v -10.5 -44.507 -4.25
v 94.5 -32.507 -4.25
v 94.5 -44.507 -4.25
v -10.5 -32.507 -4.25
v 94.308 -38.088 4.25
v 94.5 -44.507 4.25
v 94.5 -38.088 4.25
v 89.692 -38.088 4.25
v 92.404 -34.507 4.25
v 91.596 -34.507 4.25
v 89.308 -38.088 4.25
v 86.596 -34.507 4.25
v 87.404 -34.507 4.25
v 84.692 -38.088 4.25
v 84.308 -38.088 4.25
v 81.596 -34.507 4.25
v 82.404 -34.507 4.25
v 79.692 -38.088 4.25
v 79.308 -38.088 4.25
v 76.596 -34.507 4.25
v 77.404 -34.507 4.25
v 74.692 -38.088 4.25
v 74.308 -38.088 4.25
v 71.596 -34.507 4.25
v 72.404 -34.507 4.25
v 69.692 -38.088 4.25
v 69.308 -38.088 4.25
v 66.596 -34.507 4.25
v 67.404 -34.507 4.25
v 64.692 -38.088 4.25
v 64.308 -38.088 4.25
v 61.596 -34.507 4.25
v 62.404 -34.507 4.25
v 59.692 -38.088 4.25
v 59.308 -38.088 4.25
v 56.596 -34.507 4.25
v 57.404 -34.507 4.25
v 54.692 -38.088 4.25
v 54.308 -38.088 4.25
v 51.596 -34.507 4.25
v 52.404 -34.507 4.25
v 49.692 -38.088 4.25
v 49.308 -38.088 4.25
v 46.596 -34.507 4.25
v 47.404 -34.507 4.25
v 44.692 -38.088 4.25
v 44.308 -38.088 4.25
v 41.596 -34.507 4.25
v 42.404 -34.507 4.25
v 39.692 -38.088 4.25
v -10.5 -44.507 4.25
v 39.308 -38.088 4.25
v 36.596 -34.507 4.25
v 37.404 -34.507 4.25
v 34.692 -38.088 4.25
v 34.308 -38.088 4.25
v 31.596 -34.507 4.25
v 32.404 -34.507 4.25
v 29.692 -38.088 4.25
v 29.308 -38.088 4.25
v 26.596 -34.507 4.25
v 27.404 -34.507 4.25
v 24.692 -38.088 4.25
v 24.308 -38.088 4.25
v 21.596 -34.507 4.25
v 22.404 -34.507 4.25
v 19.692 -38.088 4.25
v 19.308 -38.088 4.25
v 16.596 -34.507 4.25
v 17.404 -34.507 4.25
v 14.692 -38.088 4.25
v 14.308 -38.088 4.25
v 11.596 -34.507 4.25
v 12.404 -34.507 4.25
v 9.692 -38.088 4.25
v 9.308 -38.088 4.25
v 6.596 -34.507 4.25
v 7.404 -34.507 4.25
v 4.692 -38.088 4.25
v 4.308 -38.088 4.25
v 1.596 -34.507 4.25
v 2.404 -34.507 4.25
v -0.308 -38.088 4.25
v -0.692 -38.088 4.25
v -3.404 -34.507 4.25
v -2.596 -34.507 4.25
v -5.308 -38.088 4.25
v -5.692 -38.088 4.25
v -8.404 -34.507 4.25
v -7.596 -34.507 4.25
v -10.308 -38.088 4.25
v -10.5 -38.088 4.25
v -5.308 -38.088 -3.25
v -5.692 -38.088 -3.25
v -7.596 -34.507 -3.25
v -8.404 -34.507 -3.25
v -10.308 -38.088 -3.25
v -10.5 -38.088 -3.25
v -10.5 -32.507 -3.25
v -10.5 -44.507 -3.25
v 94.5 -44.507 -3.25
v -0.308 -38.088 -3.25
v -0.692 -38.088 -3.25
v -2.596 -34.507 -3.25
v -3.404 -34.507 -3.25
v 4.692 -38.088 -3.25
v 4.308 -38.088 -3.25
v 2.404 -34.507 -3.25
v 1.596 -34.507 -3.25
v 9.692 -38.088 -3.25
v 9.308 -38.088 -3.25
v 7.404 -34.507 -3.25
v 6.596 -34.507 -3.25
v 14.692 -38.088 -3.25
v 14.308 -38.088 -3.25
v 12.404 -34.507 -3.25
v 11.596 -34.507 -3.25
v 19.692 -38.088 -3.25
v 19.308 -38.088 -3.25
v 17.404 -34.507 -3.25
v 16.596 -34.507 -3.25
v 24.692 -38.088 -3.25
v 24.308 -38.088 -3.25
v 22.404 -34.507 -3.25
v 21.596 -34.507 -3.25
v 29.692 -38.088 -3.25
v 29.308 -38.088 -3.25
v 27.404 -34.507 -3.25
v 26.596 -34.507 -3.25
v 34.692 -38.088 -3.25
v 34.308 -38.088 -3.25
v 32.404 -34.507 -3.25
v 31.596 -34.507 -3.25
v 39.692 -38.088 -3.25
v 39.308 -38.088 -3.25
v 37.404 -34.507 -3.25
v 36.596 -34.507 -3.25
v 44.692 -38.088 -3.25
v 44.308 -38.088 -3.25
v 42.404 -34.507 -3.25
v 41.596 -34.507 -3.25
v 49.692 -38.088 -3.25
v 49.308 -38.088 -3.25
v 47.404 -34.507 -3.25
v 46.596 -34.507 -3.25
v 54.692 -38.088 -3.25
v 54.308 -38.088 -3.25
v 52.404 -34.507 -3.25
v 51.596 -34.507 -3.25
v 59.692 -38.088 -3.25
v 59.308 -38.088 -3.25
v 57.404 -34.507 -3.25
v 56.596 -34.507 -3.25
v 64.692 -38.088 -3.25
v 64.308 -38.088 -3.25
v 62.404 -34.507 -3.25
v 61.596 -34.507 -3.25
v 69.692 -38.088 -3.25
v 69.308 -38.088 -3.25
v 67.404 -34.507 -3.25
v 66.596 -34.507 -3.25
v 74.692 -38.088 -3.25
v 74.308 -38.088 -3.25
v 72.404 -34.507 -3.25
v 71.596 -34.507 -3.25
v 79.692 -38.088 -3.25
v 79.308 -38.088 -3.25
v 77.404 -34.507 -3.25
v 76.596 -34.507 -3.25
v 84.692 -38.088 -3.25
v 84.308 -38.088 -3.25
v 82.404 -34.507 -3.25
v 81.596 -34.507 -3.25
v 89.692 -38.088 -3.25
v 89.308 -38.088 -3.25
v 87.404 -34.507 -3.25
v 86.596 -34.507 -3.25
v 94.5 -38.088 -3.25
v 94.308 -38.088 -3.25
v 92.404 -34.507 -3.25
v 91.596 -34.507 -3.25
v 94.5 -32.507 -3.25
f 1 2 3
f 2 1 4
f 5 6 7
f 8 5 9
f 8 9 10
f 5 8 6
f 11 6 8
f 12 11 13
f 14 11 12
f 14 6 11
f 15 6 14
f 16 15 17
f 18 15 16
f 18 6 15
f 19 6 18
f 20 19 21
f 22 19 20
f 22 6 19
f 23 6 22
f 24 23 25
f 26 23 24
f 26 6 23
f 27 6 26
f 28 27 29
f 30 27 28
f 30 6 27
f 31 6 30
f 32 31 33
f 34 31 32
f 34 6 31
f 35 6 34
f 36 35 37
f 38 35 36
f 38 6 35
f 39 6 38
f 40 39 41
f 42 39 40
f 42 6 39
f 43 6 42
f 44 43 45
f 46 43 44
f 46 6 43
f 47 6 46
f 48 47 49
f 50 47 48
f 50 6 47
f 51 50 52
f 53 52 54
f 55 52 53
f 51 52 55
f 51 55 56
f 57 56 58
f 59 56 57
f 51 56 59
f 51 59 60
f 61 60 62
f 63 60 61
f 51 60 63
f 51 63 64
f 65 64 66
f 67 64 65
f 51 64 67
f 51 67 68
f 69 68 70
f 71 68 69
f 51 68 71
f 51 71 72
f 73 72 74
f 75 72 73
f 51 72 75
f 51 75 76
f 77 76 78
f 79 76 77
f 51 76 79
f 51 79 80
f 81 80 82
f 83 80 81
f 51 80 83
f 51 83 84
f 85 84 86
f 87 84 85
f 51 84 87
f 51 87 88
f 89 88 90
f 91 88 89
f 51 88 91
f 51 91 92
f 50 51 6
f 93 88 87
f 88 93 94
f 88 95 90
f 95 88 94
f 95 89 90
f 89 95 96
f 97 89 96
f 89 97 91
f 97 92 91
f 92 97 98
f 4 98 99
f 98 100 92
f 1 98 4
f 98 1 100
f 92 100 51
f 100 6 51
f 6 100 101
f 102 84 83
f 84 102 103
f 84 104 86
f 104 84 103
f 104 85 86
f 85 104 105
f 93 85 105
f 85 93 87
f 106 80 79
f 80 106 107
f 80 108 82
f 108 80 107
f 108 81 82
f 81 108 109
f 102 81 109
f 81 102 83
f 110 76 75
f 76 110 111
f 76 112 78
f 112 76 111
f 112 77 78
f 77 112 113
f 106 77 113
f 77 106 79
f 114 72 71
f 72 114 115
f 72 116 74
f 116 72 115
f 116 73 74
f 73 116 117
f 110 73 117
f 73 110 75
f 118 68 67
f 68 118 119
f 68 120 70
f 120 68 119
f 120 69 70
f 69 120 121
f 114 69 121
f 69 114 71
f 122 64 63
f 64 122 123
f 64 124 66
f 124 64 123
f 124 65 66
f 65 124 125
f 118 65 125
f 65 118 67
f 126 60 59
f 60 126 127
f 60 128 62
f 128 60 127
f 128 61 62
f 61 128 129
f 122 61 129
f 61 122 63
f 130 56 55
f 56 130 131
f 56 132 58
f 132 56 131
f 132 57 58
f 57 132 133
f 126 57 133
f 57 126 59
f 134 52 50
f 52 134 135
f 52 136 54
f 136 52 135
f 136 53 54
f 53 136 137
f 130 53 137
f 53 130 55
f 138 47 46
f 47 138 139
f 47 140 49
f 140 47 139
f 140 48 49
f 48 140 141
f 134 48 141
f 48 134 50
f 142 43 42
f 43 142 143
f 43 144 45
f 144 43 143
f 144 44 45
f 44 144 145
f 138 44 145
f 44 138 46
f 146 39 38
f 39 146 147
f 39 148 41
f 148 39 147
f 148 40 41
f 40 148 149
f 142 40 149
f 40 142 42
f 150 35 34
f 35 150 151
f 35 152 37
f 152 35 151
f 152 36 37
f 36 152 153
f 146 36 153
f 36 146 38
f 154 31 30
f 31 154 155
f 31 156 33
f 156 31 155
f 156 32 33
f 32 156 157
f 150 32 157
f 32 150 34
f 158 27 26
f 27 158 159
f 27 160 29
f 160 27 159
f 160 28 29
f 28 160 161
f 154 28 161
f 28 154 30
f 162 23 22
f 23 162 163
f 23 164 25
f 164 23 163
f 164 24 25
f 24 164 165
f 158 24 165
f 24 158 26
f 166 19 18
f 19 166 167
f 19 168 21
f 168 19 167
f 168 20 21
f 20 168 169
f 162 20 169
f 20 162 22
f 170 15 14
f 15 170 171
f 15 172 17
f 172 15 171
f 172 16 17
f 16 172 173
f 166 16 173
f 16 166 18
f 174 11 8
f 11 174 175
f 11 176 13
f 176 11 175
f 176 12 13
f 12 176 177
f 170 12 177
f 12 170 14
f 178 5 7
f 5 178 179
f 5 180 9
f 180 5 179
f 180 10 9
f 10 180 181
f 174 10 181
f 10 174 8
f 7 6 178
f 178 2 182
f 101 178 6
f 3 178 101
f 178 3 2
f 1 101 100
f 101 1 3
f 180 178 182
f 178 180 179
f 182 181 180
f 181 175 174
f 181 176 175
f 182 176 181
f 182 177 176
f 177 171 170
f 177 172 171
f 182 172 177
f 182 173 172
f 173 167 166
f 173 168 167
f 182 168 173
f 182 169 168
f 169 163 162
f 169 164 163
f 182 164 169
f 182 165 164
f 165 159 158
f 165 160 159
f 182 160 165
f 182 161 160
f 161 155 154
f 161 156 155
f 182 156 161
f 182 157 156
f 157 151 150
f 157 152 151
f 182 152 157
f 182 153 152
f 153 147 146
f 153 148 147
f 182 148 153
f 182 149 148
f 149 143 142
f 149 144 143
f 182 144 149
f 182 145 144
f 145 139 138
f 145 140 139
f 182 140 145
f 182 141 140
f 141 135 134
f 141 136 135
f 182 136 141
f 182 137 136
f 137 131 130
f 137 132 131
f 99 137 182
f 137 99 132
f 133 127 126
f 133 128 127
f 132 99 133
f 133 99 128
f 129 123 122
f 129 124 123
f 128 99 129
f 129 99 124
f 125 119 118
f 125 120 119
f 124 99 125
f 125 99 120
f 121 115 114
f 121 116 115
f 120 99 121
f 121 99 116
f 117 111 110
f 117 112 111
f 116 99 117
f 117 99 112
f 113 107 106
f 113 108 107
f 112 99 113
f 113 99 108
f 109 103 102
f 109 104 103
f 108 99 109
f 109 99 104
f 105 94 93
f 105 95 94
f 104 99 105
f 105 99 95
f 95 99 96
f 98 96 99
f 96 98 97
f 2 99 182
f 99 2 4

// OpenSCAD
//This is a modification of " Public Domain Parametric Involute Spur Gear (and involute helical gear and involute rack)
// by Leemon Baird, 2011, Leemon@Leemon.com
//http://www.thingiverse.com/thing:5505  "

//Modifications by racatack June 2016:
//  -Incorporated 'module InvoluteGear_rack()' from the 11/11/15 comment by quisam2342 in thing:5505 to fix noted problems in rack generation at various tooth sizes
//  -Added a section for an optional 'backboard' that can be used to stiffen an otherwise skinny rack
//  -Added sections for optional Stop Blocks at either or both ends of a rack
//  -Removed extra gears from the example since I only need one pinion. See thing:5505 example section to gain more insight into gear generation.





//////////////////////////////////////////////////////////////////////////////////////////////
// Public Domain Parametric Involute Spur Gear (and involute helical gear and involute rack)
// version 1.1
// by Leemon Baird, 2011, Leemon@Leemon.com
//http://www.thingiverse.com/thing:5505
//
// This file is public domain.  Use it for any purpose, including commercial
// applications.  Attribution would be nice, but is not required.  There is
// no warranty of any kind, including its correctness, usefulness, or safety.
// 
// This is parameterized involute spur (or helical) gear.  It is much simpler and less powerful than
// others on Thingiverse.  But it is public domain.  I implemented it from scratch from the 
// descriptions and equations on Wikipedia and the web, using Mathematica for calculations and testing,
// and I now release it into the public domain.
//
//		http://en.wikipedia.org/wiki/Involute_gear
//		http://en.wikipedia.org/wiki/Gear
//		http://en.wikipedia.org/wiki/List_of_gear_nomenclature
//		http://gtrebaol.free.fr/doc/catia/spur_gear.html
//		http://www.cs.cmu.edu/~rapidproto/mechanisms/chpt7.html
//
// The module gear() gives an involute spur gear, with reasonable defaults for all the parameters.
// Normally, you should just choose the first 4 parameters, and let the rest be default values.
// The module gear() gives a gear in the XY plane, centered on the origin, with one tooth centered on
// the positive Y axis.  The various functions below it take the same parameters, and return various
// measurements for the gear.  The most important is pitch_radius, which tells how far apart to space
// gears that are meshing, and adendum_radius, which gives the size of the region filled by the gear.
// A gear has a "pitch circle", which is an invisible circle that cuts through the middle of each
// tooth (though not the exact center). In order for two gears to mesh, their pitch circles should 
// just touch.  So the distance between their centers should be pitch_radius() for one, plus pitch_radius() 
// for the other, which gives the radii of their pitch circles.
//
// In order for two gears to mesh, they must have the same mm_per_tooth and pressure_angle parameters.  
// mm_per_tooth gives the number of millimeters of arc around the pitch circle covered by one tooth and one
// space between teeth.  The pitch angle controls how flat or bulged the sides of the teeth are.  Common
// values include 14.5 degrees and 20 degrees, and occasionally 25.  Though I've seen 28 recommended for
// plastic gears. Larger numbers bulge out more, giving stronger teeth, so 28 degrees is the default here.
//
// The ratio of number_of_teeth for two meshing gears gives how many times one will make a full 
// revolution when the the other makes one full revolution.  If the two numbers are coprime (i.e. 
// are not both divisible by the same number greater than 1), then every tooth on one gear
// will meet every tooth on the other, for more even wear.  So coprime numbers of teeth are good.
//
// The module rack() gives a rack, which is a bar with teeth.  A rack can mesh with any
// gear that has the same mm_per_tooth and pressure_angle.
//
// Some terminology: 
// The outline of a gear is a smooth circle (the "pitch circle") which has mountains and valleys
// added so it is toothed.  So there is an inner circle (the "root circle") that touches the 
// base of all the teeth, an outer circle that touches the tips of all the teeth,
// and the invisible pitch circle in between them.  There is also a "base circle", which can be smaller than
// all three of the others, which controls the shape of the teeth.  The side of each tooth lies on the path 
// that the end of a string would follow if it were wrapped tightly around the base circle, then slowly unwound.  
// That shape is an "involute", which gives this type of gear its name.
//
//////////////////////////////////////////////////////////////////////////////////////////////

//An involute spur gear, with reasonable defaults for all the parameters.
//Normally, you should just choose the first 4 parameters, and let the rest be default values.
//Meshing gears must match in mm_per_tooth, pressure_angle, and twist,
//and be separated by the sum of their pitch radii, which can be found with pitch_radius().
module gear (
	mm_per_tooth    = 3,    //this is the "circular pitch", the circumference of the pitch circle divided by the number of teeth
	number_of_teeth = 11,   //total number of teeth around the entire perimeter
	thickness       = 6,    //thickness of gear in mm
	hole_diameter   = 3,    //diameter of the hole in the center, in mm
	twist           = 0,    //teeth rotate this many degrees from bottom of gear to top.  360 makes the gear a screw with each thread going around once
	teeth_to_hide   = 0,    //number of teeth to delete to make this only a fraction of a circle
	pressure_angle  = 28,   //Controls how straight or bulged the tooth sides are. In degrees.
	clearance       = 0.0,  //gap between top of a tooth on one gear and bottom of valley on a meshing gear (in millimeters)
	backlash        = 0.0   //gap between two meshing teeth, in the direction along the circumference of the pitch circle
) {
	assign(pi = 3.1415926)
	assign(p  = mm_per_tooth * number_of_teeth / pi / 2)  //radius of pitch circle
	assign(c  = p + mm_per_tooth / pi - clearance)        //radius of outer circle
	assign(b  = p*cos(pressure_angle))                    //radius of base circle
	assign(r  = p-(c-p)-clearance)                        //radius of root circle
	assign(t  = mm_per_tooth/2-backlash/2)                //tooth thickness at pitch circle
	assign(k  = -iang(b, p) - t/2/p/pi*180) {             //angle to where involute meets base circle on each side of tooth
		difference() {
			for (i = [0:number_of_teeth-teeth_to_hide-1] )
				rotate([0,0,i*360/number_of_teeth])
					linear_extrude(height = thickness, center = true, convexity = 10, twist = twist)
						polygon(
							points=[
								[0, -hole_diameter/10],
								polar(r, -181/number_of_teeth),
								polar(r, r<b ? k : -180/number_of_teeth),
								q7(0/5,r,b,c,k, 1),q7(1/5,r,b,c,k, 1),q7(2/5,r,b,c,k, 1),q7(3/5,r,b,c,k, 1),q7(4/5,r,b,c,k, 1),q7(5/5,r,b,c,k, 1),
								q7(5/5,r,b,c,k,-1),q7(4/5,r,b,c,k,-1),q7(3/5,r,b,c,k,-1),q7(2/5,r,b,c,k,-1),q7(1/5,r,b,c,k,-1),q7(0/5,r,b,c,k,-1),
								polar(r, r<b ? -k : 180/number_of_teeth),
								polar(r, 181/number_of_teeth)
							],
 							paths=[[0,1,2,3,4,5,6,7,8,9,10,11,12,13,14,15,16]]
						);
			cylinder(h=2*thickness+1, r=hole_diameter/2, center=true, $fn=20);
		}
	}
};	
//these 4 functions are used by gear
function polar(r,theta)   = r*[sin(theta), cos(theta)];                            //convert polar to cartesian coordinates
function iang(r1,r2)      = sqrt((r2/r1)*(r2/r1) - 1)/3.1415926*180 - acos(r1/r2); //unwind a string this many degrees to go from radius r1 to radius r2
function q7(f,r,b,r2,t,s) = q6(b,s,t,(1-f)*max(b,r)+f*r2);                         //radius a fraction f up the curved side of the tooth 
function q6(b,s,t,d)      = polar(d,s*(iang(b,d)+t));                              //point at radius d on the involute curve

//a rack, which is a straight line with teeth (the same as a segment from a giant gear with a huge number of teeth).
//The "pitch circle" is a line along the X axis.
//module rack (
//	mm_per_tooth    = 3,    //this is the "circular pitch", the circumference of the pitch circle divided by the number //of teeth
//	number_of_teeth = 11,   //total number of teeth along the rack
//	thickness       = 6,    //thickness of rack in mm (affects each tooth)
//	height          = 120,   //height of rack in mm, from tooth top to far side of rack.
//	pressure_angle  = 28,   //Controls how straight or bulged the tooth sides are. In degrees.
//	backlash        = 0.0   //gap between two meshing teeth, in the direction along the circumference of the pitch circle
//) {
//	assign(pi = 3.1415926)
//	assign(a = mm_per_tooth / pi) //addendum
//	assign(t = a*cos(pressure_angle)-1)         //tooth side is tilted so top/bottom corners move this amount
//		for (i = [0:number_of_teeth-1] )
//			translate([i*mm_per_tooth,0,0])
//				linear_extrude(height = thickness, center = true, convexity = 10)
//					polygon(
//						points=[
//							[-mm_per_tooth * 3/4,                 a-height],
//							[-mm_per_tooth * 3/4 - backlash,     -a],
//							[-mm_per_tooth * 1/4 + backlash - t, -a],
//							[-mm_per_tooth * 1/4 + backlash + t,  a],
//							[ mm_per_tooth * 1/4 - backlash - t,  a],
//							[ mm_per_tooth * 1/4 - backlash + t, -a],
//							[ mm_per_tooth * 3/4 + backlash,     -a],
//							[ mm_per_tooth * 3/4,                 a-height],
//						],
//						paths=[[0,1,2,3,4,5,6,7]]
//					);
//};	


  //rac note - This section generates the rack body and teeth. It is from the 11/11/15 comment by quisam2342 in thing:5505 to fix noted problems with rack generation, and replaces the original 'module rack()'
////////////////////////////////////////////////////////////////////////////////////////////////
// The module InvoluteGear_rack() gives a involute gear rack, which is a bar with teeth.
// A rack can mesh with any gear that has the same mm_per_tooth and pressure_angle.
// The "pitch circle" is a line along the X axis.
//
// mm_per_tooth     this is the "circular pitch", the circumference of the pitch circle
//                  divided by the number of teeth
//
// number_of_teeth  total number of teeth along the rack
//
// thickness        thickness of rack in mm
//
// height           height of rack in mm, from tooth top to far side of rack
//
// pressure_angle   controls how straight or bulged the tooth sides are, in degrees
//
// clearance        gap between top of a tooth on one gear and bottom of valley
//                  on a meshing gear, in millimeters
//
// backlash         gap between two meshing teeth, in the direction along the circumference
//                  of the pitch circle
////////////////////////////////////////////////////////////////////////////////////////////////



module InvoluteGear_rack (
    mm_per_tooth    = 3,   //Default numbers in this section get overridden by numbers in 'example rack and pinion' section, so set your values there.
    number_of_teeth = 11,
    thickness       = 6,
    height          = 4,
    
  //rac - Added variables for backboard and stop blocks: 
 //set your values in the 'example rack and pinion' section, as defaults given here will be overridden by that section 
    backboard_thickness = 2.0,
    backboard_height = 1.0, 
    stop_height = backboard_height, 
    left_stop_enable = 1, 
    right_stop_enable = 1,
    
//These defaults are not redefined in the example section:
    pressure_angle  = 28,  
    clearance       = 0.0,
    backlash        = 0.0

)

{
    // addendum - tooth height above pitch line
    assign(addendum =        module_value(mm_per_tooth) - clearance)

    // dedendum - tooth height below pitch line
    assign(dedendum = 1.25 * module_value(mm_per_tooth)            ) 


    for (i = [0:number_of_teeth-1] )
        translate([(i+0.5)*mm_per_tooth,height-addendum,0])
            linear_extrude(height = thickness, center = true, convexity = 10)  //'height' parameter here is not the same as 'height' parameter of module
                polygon(
                    points=[
                        [-1/2 * mm_per_tooth,                                              addendum-height],
                        [-1/2 * mm_per_tooth,                                             -dedendum],
                        [-1/4 * mm_per_tooth + backlash - dedendum * tan(pressure_angle), -dedendum],
                        [-1/4 * mm_per_tooth + backlash + addendum * tan(pressure_angle),  addendum],
                        [ 1/4 * mm_per_tooth - backlash - addendum * tan(pressure_angle),  addendum],
                        [ 1/4 * mm_per_tooth - backlash + dedendum * tan(pressure_angle), -dedendum],
                        [ 1/2 * mm_per_tooth,                                             -dedendum],
                        [ 1/2 * mm_per_tooth,                                              addendum-height],
                    ],
                    paths=[[0,1,2,3,4,5,6,7]]
                );

   //rac -added - This section optionally creates a 'stop block' at the left end of the rack
            translate([(-0.11)*mm_per_tooth,0,0.5*(-thickness)])  
            linear_extrude(height = left_stop_enable*thickness, center = false, convexity = 10)
                polygon(
                    points=[
                        [-1/2 * mm_per_tooth,height+stop_height],   //stop_height extends stop block above teeth, change the number to change the extension amount
                        [-1/2 * mm_per_tooth,0],
                        [ 1/2 * mm_per_tooth,0],
                        [ 1/2 * mm_per_tooth,height+stop_height],   //stop_height extends stop block above teeth, change the number to change the extension amount
                    ],
                    paths=[[0,1,2,3]]
                );


    //rac -added - This section optionally creates a 'stop block' at the right end of the rack
            translate([(0.11+number_of_teeth)*mm_per_tooth,0,0.5*(-thickness)])  
            linear_extrude(height = right_stop_enable*thickness, center = false, convexity = 10)
                polygon(
                    points=[
                        [-1/2 * mm_per_tooth,height+stop_height],   //stop_height extends stop block above teeth
                        [-1/2 * mm_per_tooth,0],
                        [ 1/2 * mm_per_tooth,0],
                        [ 1/2 * mm_per_tooth,height+stop_height],   //stop_height extends stop block above teeth
                    ],
                    paths=[[0,1,2,3]]
                );


    //rac -added - This section optionally creates a 'backboard' on one side of the rack. Can be used to add stiffness for a 'thin' rack (i.e. a rack with low height and/or thickness numbers) or if a large negative height is used it can extend under the rack as a mounting flange.
    for (i = [0:number_of_teeth-1] )
        translate([(i+0.5)*mm_per_tooth,0,0.5*(-thickness+backboard_thickness)])    
        //0.55*(-thickness+backboard_thickness) starts the backboard at one side of the rack and extrudes it inward
            linear_extrude(height = backboard_thickness, center = true, convexity = 10)
                polygon(
                    points=[
                        [-1/2 * mm_per_tooth,height+backboard_height],   //backboard_height extends backboard above teeth
                        [-1/2 * mm_per_tooth,0],

                        [ 1/2 * mm_per_tooth,0],
                        [ 1/2 * mm_per_tooth,height+backboard_height],   //backboard_height extends backboard above teeth
                    ],
                    paths=[[0,1,2,3]]
                );


}


//These 5 functions let the user find the derived dimensions of the gear.
//A gear fits within a circle of radius outer_radius, and two gears should have
//their centers separated by the sum of their pictch_radius.
function circular_pitch  (mm_per_tooth=3) = mm_per_tooth;                     //tooth density expressed as "circular pitch" in millimeters
function diametral_pitch (mm_per_tooth=3) = 3.1415926 / mm_per_tooth;         //tooth density expressed as "diametral pitch" in teeth per millimeter
function module_value    (mm_per_tooth=3) = mm_per_tooth / 3.1415926;                //tooth density expressed as "module" or "modulus" in millimeters
function pitch_radius    (mm_per_tooth=3,number_of_teeth=11) = mm_per_tooth * number_of_teeth / 3.1415926 / 2;
function outer_radius    (mm_per_tooth=3,number_of_teeth=11,clearance=0.1)    //The gear fits entirely within a cylinder of this radius.
	= mm_per_tooth*(1+number_of_teeth/2)/3.1415926  - clearance;              

//////////////////////////////////////////////////////////////////////////////////////////////
//example rack and pinion: 
//ENTER YOUR VALUES HERE: (not in InvoluteGear_rack() defaults)

//all distances in mm
//n1 = 22; //num teeth of servo gear
n1 = 22; //num teeth of pot gear

n5 = 21;  //gray rack number of teeth
mm_per_tooth = 5; //all meshing gears need the same mm_per_tooth (and the same pressure_angle)
//thickness    = 9;  // depth of the rack, including backboard if any. The pinion will be this depth minus the backboard_thickness
thickness = 8.5;
hole         = 6;   //hole diameter in pinion gear
height       = 10;  // distance from bottom of the rack to the tips of the teeth

//rac - Added - Set your values for Backboard and Stop Blocks here 
backboard_thickness = 1.0; //set to zero for no backboard
backboard_height = 2;   //set to zero for top of backboard to be even with tips of teeth, a positive number will extend above the teeth by the chosen amount, vice-versa for negative (use large negative to make a flange on underside of rack)
stop_height = 0; //Stop Blocks will extend this much above the teeth, can be positive or negative
left_stop_enable = 0;  //set to 1 to generate Left Stop Block, set to 0 to disable
right_stop_enable = 0;  //set to 1 to generate Right Stop Block, set to 0 to disable

//end of inputs -------------------------------------------------------

d1 =pitch_radius(mm_per_tooth,n1);

//Generation of pinion gear:
difference() {
    
//translate([ 0,    0, -.5*backboard_thickness]) rotate([0,0, $t*360/n1])                 color([1.00,0.75,0.75]) gear(mm_per_tooth,n1,(thickness-backboard_thickness),hole); //rac -RE above: 'thickness-backboard_thickness' is used here to reduce gear thickness for backboard on rack, The '-.5*backboard_thickness' in translate puts gear bottom even with rack bottom
//translate([0, 0, -2.3])    cylinder(h = 20, r = 10.85, $fn=200);
//translate([0, 0, 3.5])    cylinder(h = 20, r = 20, $fn=200);
    
//translate([0, 0, -2.3])    cylinder(h = 20, r = 3.05, $fn=200);


}



function rel_to_abs(list, i = 0, sum = [0,0], result = []) = 
    i == len(list) ? result : rel_to_abs(list, i + 1, sum + list[i], concat(result, [sum + list[i]]));

//Generation of rack, and Relative positioning of gear and rack:

union() {
translate([0,-10,0]) translate([(-floor(n5/2)-floor(n1/2)+$t+n1/2-1/2), -height-backboard_height-d1-mm_per_tooth, 0]) rotate([0,0,0]) color([0.75,0.75,0.75]) InvoluteGear_rack(mm_per_tooth,n5,thickness,height,backboard_thickness,backboard_height,stop_height,left_stop_enable,right_stop_enable);   //rac - In the above 'translate' instruction, the middle parameter sets spacing between the rack and the pinion. I've set it to '-height-backboard_height-d1-mm_per_tooth' to give a proportionate offset that allows for ease of printing for most sets of gear & rack parameters. If you use a large negative backboard height the gear and rack may overlap. That can be fixed by substituting some other number/formula for '-height-backboard_height-d1-mm_per_tooth'. Try for example -3*d1, or just subtract an additional fixed offset from what's in there now (e.g. (-height-backboard_height-d1-mm_per_tooth)-14.)

//translate([100.5,-10,0]) translate([(-floor(n5/2)-floor(n1/2)+$t+n1/2-1/2), -height-backboard_height-d1-mm_per_tooth, 0]) rotate([0,0,0]) color([0.75,0.75,0.75]) InvoluteGear_rack(mm_per_tooth,n5,thickness,height,backboard_thickness,backboard_height,stop_height,left_stop_enable,right_stop_enable);
}
/*
difference() {
translate([59.5, -48.1409, 0]) linear_extrude(4.25) polygon(rel_to_abs([[0,0],[0,4],[60,0],[0,-4]]));
    
translate([59.5, -48.1409,2.25]) translate([5,1.9,0]) cylinder(h = 2, r = 1.9, $fn=50);
translate([59.5, -48.1409,2.25]) translate([5,1.9,-10]) cylinder(h = 10, r = 1, $fn=50); 
translate([59.5, -48.1409,2.25]) translate([25,1.9,0]) cylinder(h = 2, r = 1.9, $fn=50);
translate([59.5, -48.1409,2.25]) translate([25,1.9,-10]) cylinder(h = 10, r = 1, $fn=50); 
translate([59.5, -48.1409,2.25]) translate([35,1.9,0]) cylinder(h = 2, r = 1.9, $fn=50);
translate([59.5, -48.1409,2.25]) translate([35,1.9,-10]) cylinder(h = 10, r = 1, $fn=50); 
translate([59.5, -48.1409,2.25]) translate([55,1.9,0]) cylinder(h = 2, r = 1.9, $fn=50);
translate([59.5, -48.1409,2.25]) translate([55,1.9,-10]) cylinder(h = 10, r = 1, $fn=50); 
}
*/

//end of example rack and pinion 
//////////////////////////////////////////////////////////////////////////////////////////////////
